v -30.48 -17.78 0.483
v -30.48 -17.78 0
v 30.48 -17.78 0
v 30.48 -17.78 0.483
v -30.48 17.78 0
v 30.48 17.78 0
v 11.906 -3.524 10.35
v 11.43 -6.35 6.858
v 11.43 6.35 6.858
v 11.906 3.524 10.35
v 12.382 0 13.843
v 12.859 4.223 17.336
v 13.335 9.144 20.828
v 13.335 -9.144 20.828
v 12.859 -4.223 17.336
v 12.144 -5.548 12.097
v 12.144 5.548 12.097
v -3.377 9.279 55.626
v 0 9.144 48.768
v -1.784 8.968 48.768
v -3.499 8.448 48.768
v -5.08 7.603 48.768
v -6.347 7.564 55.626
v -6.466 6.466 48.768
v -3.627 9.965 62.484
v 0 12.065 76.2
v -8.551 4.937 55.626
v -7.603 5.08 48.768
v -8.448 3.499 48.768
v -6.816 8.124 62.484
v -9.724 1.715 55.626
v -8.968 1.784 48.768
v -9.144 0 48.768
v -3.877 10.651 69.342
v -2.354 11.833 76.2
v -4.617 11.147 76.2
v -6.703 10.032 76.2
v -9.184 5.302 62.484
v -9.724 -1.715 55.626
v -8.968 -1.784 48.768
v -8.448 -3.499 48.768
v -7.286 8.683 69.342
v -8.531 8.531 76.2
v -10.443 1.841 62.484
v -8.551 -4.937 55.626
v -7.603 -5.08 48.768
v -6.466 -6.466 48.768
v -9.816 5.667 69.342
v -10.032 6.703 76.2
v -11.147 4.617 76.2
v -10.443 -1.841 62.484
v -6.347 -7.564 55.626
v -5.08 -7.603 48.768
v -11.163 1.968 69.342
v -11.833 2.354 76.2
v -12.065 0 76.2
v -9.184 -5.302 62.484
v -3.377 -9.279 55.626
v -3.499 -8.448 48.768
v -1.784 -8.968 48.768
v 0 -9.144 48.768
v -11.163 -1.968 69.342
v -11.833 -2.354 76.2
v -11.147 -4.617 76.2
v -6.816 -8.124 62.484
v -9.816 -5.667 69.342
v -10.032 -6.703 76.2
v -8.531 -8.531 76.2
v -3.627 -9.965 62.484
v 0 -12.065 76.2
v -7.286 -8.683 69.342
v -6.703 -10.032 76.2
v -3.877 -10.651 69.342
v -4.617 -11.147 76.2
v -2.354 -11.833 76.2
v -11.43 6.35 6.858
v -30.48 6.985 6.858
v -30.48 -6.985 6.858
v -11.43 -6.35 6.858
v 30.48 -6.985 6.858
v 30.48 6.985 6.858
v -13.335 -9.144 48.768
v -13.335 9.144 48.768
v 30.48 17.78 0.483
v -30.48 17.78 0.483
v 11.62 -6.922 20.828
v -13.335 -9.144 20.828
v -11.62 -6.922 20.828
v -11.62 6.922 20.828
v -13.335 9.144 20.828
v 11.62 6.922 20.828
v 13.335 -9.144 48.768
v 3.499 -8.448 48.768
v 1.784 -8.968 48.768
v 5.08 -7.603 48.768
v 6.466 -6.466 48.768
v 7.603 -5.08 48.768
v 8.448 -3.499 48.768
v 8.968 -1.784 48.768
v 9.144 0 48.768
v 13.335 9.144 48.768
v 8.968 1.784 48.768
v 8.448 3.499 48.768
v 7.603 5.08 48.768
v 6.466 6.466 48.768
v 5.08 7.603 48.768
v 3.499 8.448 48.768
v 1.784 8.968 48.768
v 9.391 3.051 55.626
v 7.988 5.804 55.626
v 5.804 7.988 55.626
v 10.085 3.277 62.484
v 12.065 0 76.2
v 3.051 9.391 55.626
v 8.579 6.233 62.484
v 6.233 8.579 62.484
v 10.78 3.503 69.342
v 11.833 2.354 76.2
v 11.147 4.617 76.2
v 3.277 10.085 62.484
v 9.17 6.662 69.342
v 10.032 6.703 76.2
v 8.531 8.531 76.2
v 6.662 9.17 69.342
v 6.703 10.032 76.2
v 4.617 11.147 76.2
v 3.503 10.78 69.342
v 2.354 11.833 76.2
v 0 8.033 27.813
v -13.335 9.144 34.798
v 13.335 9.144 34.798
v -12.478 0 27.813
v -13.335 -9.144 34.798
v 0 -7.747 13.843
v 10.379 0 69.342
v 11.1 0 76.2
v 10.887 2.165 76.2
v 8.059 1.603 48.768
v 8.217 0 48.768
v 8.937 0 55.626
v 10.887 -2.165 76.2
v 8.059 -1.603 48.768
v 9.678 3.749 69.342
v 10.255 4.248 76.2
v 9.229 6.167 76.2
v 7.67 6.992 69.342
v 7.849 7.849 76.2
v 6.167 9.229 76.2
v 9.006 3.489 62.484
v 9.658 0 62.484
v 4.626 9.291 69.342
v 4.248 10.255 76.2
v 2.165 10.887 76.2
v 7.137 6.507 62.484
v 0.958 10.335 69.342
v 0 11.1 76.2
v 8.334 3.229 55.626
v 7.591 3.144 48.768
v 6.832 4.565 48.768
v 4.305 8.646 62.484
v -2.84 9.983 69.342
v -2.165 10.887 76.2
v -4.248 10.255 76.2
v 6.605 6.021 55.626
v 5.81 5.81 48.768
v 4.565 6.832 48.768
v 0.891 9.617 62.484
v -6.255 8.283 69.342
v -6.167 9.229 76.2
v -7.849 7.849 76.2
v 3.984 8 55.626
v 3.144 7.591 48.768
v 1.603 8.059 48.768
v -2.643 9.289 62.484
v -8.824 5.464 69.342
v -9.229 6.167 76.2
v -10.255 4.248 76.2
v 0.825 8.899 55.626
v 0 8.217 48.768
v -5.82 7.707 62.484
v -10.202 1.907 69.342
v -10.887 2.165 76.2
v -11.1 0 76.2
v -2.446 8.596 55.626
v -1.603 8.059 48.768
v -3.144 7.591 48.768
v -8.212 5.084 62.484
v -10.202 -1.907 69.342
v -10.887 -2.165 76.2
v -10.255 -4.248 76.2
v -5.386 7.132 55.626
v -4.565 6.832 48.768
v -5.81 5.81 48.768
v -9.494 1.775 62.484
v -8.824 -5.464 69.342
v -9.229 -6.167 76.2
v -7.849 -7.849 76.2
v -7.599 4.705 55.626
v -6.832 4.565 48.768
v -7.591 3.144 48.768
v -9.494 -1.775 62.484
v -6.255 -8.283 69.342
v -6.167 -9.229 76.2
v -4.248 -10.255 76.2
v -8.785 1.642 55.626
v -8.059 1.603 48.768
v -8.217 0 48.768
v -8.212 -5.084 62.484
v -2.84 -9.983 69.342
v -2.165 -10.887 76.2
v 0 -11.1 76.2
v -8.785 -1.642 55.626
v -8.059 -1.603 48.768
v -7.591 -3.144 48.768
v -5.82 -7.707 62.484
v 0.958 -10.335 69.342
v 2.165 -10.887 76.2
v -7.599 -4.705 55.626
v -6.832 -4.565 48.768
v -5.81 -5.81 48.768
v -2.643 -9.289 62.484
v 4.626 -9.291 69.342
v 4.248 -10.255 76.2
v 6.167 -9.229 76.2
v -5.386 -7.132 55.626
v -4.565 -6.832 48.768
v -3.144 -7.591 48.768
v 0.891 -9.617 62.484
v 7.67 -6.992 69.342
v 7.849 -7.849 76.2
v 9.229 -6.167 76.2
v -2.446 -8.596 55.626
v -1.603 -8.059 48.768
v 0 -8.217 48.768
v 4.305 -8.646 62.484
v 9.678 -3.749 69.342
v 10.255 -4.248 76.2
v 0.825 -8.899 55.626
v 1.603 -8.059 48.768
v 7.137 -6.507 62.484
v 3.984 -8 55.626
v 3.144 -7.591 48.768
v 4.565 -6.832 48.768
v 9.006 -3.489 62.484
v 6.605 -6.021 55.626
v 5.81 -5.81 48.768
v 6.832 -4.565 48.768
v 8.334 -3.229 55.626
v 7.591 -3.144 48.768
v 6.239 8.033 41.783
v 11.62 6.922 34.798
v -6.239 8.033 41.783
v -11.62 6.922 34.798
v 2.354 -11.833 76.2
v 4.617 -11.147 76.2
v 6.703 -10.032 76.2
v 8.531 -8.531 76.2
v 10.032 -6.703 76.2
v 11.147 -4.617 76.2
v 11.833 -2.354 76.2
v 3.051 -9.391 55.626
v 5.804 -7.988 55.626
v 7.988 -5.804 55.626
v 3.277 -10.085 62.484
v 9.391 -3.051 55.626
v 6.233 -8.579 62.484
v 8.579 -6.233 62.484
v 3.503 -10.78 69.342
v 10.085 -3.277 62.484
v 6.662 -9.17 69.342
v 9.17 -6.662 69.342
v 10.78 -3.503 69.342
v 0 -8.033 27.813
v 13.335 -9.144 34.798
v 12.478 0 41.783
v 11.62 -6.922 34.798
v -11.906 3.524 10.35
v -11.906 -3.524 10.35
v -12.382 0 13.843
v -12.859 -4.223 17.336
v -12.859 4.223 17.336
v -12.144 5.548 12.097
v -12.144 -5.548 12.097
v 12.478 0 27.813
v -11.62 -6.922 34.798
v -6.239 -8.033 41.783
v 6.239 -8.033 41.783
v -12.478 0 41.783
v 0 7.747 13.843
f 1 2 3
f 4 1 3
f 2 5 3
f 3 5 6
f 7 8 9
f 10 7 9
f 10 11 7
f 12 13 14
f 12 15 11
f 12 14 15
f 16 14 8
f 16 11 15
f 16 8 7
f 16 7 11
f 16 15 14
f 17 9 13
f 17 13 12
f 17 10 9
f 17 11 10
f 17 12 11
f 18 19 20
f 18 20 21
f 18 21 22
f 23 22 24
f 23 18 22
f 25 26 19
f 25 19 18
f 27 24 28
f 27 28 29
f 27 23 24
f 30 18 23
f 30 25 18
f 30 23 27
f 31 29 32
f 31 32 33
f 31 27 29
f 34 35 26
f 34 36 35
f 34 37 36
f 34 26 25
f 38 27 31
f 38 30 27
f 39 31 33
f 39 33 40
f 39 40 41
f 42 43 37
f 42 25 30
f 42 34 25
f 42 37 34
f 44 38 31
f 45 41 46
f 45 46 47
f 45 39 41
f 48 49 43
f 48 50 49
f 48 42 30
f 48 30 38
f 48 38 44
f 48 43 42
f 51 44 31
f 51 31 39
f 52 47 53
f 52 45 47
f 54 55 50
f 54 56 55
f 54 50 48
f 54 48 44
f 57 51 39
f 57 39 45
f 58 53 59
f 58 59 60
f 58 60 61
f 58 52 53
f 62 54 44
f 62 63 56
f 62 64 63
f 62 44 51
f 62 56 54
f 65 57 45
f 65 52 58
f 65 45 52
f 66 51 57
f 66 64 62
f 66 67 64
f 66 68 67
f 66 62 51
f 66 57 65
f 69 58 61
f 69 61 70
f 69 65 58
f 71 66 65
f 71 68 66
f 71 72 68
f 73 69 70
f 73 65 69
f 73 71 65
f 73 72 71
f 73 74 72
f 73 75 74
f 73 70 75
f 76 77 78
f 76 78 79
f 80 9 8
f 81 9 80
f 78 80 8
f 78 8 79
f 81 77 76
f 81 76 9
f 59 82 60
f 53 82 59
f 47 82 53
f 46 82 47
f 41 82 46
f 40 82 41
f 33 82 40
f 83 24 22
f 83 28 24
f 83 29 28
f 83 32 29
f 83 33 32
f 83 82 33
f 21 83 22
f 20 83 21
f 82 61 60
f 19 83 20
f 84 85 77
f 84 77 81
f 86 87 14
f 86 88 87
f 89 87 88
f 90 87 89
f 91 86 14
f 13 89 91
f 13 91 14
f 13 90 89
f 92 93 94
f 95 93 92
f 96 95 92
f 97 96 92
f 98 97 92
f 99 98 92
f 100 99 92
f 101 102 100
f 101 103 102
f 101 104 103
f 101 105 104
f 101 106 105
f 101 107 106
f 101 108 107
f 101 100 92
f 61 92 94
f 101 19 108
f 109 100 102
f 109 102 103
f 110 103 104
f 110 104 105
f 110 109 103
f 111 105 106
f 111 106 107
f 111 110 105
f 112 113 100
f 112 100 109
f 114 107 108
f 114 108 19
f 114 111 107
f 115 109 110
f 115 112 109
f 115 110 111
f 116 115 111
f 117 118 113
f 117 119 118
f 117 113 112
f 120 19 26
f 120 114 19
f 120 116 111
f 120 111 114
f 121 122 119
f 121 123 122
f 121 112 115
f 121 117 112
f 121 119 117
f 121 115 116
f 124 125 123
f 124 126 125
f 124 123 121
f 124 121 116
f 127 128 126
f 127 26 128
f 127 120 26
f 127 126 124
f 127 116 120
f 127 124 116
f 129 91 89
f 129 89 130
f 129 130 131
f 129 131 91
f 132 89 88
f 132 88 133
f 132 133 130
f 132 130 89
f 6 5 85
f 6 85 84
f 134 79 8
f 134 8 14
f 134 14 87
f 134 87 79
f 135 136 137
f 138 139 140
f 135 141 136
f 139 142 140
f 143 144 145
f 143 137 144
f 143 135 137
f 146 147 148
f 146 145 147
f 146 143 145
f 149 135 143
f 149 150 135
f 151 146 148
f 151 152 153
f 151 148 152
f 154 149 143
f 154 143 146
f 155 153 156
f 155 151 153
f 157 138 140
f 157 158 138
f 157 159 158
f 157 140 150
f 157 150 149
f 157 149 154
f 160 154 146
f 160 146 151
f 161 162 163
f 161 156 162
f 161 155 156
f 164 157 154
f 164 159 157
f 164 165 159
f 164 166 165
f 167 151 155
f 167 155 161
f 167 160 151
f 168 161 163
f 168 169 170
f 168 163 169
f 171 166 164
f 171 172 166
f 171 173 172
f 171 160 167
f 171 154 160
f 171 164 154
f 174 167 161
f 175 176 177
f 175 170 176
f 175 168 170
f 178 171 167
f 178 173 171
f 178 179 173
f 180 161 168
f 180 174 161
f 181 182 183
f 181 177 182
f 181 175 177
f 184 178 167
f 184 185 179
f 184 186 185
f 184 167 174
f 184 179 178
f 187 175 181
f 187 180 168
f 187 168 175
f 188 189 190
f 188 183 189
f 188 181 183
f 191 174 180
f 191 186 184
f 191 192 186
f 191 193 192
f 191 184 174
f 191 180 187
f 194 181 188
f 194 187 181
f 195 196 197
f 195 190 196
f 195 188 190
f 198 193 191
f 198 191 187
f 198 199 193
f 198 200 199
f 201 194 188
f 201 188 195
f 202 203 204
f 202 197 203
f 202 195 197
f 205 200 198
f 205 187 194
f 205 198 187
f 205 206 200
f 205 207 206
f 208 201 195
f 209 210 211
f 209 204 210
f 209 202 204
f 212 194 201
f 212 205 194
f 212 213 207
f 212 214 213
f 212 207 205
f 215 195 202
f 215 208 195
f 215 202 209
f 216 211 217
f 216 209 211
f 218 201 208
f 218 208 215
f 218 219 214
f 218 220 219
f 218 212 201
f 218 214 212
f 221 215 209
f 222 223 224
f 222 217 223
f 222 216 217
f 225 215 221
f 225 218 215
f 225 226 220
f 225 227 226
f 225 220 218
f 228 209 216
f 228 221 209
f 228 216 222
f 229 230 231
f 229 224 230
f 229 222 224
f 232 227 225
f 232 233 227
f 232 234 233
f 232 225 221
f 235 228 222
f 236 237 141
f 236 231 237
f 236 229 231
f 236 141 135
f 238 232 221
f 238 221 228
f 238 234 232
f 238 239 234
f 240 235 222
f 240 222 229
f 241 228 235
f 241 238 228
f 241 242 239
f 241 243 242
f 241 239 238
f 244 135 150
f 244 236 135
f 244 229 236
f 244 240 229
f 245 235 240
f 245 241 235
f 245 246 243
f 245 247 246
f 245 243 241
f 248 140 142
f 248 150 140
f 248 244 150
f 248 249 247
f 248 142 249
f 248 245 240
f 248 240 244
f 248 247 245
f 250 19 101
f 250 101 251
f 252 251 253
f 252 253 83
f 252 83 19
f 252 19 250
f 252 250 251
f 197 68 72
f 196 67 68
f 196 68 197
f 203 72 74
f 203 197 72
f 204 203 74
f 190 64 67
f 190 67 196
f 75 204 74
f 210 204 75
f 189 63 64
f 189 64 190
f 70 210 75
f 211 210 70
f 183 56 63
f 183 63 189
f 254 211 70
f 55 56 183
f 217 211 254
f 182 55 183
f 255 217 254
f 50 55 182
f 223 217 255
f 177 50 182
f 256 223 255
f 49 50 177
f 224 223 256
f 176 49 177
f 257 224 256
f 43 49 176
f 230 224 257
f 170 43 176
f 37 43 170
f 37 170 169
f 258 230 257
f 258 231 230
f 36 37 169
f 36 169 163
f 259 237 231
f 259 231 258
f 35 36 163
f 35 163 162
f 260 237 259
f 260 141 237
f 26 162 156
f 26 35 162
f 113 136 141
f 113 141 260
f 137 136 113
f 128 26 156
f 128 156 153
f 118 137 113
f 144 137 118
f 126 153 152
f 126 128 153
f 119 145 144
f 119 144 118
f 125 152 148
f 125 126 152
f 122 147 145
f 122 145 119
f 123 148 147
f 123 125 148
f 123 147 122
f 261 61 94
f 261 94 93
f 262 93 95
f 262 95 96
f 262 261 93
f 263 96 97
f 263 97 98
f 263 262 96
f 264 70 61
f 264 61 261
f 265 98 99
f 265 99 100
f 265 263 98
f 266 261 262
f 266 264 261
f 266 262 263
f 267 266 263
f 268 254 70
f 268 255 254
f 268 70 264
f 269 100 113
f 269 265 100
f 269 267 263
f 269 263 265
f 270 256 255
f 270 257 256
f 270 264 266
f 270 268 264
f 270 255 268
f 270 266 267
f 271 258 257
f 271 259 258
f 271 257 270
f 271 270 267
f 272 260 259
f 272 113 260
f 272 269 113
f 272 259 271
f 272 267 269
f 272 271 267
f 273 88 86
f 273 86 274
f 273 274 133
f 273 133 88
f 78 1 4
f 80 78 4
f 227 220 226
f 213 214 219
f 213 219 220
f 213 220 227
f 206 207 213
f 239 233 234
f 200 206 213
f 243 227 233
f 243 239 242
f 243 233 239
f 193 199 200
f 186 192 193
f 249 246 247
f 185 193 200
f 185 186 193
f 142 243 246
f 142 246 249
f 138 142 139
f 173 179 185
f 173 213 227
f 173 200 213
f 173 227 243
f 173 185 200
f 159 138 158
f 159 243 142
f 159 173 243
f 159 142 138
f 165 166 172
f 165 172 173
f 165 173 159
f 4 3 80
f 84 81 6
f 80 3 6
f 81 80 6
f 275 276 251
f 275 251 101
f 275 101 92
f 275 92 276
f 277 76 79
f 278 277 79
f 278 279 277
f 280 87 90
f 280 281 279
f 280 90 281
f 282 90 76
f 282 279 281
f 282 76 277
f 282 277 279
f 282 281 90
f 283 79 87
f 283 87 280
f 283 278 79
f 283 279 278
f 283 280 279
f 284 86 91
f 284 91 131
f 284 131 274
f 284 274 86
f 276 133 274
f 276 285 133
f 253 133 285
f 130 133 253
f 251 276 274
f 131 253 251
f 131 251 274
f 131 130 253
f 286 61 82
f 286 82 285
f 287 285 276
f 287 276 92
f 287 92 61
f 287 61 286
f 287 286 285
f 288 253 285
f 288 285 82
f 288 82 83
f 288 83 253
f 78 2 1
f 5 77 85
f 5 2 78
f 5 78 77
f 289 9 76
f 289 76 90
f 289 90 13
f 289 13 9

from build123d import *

# Parameters (mm, degrees)
F0_W      = 60.96
F0_H      = 35.56
F1_DEPTH  = 6.858
F2_SIZE2  = 6.3754
F2_SIZE   = 10.795
F3_W      = 22.86
F3_H      = 12.7
F5_W      = 26.67
F5_H      = 18.288
F8_W      = 23.241
F8_H      = 13.843
F9_W      = 26.67
F9_H      = 18.288
F12_W     = 23.241
F12_H     = 13.843
F13_W     = 26.67
F13_H     = 18.288
F17_R     = 12.065
F19_R     = 11.0998
F20_DEPTH = 27.432
F20_TAPER = 6


with BuildPart() as f1:
    # F0 (on Top) → F1 (new body)
    with BuildSketch(Plane.XY):
        Rectangle(F0_W, F0_H)
    extrude(amount=F1_DEPTH)

    # F2
    f2_edges = [f1.edges().sort_by_distance(p)[0] for p in [
        (0, 17.78, 6.858),
        (0, -17.78, 6.858),
    ]]
    f2_side = f1.faces().sort_by_distance((0, 0, 6.858))[0]
    chamfer(f2_edges, length=F2_SIZE, length2=F2_SIZE2, reference=f2_side)

    # F3 (on face) → F6 section 0
    with BuildSketch(Plane.XY.offset(6.858)):
        Rectangle(F3_W, F3_H)
    # F5 (on offset) → F6 section 1
    with BuildSketch(Plane.XY.offset(20.828)):
        Rectangle(F5_W, F5_H)
    loft()

    # F8 (on face) → F10 section 0
    with BuildSketch(Plane.XY.offset(20.828)):
        Rectangle(F8_W, F8_H)
    # F9 (on offset) → F10 section 1
    with BuildSketch(Plane.XY.offset(34.798)):
        Rectangle(F9_W, F9_H)
    loft()

    # F12 (on face) → F14 section 0
    with BuildSketch(Plane.XY.offset(34.798)):
        Rectangle(F12_W, F12_H)
    # F13 (on offset) → F14 section 1
    with BuildSketch(Plane.XY.offset(48.768)):
        Rectangle(F13_W, F13_H)
    loft()

    # F15 (on face) → F18 section 0
    with BuildSketch(Plane.XY.offset(48.768)):
        with BuildLine():
            ThreePointArc((0, 9.144), (-9.144, 0), (0, -9.144))
            ThreePointArc((0, -9.144), (6.4657844072, -6.4657844072), (9.144, 0))
            ThreePointArc((9.144, 0), (6.4657844072, 6.4657844072), (0, 9.144))
        make_face()
    # F17 (on offset) → F18 section 1
    with BuildSketch(Plane.XY.offset(76.2)):
        Circle(F17_R)
    loft()

    # F19 (on face) → F20 (cut, through all)
    with BuildSketch(Plane.XY.offset(76.2)):
        Circle(F19_R)
    extrude(amount=-F20_DEPTH, taper=F20_TAPER, mode=Mode.SUBTRACT)


solid = f1.part
